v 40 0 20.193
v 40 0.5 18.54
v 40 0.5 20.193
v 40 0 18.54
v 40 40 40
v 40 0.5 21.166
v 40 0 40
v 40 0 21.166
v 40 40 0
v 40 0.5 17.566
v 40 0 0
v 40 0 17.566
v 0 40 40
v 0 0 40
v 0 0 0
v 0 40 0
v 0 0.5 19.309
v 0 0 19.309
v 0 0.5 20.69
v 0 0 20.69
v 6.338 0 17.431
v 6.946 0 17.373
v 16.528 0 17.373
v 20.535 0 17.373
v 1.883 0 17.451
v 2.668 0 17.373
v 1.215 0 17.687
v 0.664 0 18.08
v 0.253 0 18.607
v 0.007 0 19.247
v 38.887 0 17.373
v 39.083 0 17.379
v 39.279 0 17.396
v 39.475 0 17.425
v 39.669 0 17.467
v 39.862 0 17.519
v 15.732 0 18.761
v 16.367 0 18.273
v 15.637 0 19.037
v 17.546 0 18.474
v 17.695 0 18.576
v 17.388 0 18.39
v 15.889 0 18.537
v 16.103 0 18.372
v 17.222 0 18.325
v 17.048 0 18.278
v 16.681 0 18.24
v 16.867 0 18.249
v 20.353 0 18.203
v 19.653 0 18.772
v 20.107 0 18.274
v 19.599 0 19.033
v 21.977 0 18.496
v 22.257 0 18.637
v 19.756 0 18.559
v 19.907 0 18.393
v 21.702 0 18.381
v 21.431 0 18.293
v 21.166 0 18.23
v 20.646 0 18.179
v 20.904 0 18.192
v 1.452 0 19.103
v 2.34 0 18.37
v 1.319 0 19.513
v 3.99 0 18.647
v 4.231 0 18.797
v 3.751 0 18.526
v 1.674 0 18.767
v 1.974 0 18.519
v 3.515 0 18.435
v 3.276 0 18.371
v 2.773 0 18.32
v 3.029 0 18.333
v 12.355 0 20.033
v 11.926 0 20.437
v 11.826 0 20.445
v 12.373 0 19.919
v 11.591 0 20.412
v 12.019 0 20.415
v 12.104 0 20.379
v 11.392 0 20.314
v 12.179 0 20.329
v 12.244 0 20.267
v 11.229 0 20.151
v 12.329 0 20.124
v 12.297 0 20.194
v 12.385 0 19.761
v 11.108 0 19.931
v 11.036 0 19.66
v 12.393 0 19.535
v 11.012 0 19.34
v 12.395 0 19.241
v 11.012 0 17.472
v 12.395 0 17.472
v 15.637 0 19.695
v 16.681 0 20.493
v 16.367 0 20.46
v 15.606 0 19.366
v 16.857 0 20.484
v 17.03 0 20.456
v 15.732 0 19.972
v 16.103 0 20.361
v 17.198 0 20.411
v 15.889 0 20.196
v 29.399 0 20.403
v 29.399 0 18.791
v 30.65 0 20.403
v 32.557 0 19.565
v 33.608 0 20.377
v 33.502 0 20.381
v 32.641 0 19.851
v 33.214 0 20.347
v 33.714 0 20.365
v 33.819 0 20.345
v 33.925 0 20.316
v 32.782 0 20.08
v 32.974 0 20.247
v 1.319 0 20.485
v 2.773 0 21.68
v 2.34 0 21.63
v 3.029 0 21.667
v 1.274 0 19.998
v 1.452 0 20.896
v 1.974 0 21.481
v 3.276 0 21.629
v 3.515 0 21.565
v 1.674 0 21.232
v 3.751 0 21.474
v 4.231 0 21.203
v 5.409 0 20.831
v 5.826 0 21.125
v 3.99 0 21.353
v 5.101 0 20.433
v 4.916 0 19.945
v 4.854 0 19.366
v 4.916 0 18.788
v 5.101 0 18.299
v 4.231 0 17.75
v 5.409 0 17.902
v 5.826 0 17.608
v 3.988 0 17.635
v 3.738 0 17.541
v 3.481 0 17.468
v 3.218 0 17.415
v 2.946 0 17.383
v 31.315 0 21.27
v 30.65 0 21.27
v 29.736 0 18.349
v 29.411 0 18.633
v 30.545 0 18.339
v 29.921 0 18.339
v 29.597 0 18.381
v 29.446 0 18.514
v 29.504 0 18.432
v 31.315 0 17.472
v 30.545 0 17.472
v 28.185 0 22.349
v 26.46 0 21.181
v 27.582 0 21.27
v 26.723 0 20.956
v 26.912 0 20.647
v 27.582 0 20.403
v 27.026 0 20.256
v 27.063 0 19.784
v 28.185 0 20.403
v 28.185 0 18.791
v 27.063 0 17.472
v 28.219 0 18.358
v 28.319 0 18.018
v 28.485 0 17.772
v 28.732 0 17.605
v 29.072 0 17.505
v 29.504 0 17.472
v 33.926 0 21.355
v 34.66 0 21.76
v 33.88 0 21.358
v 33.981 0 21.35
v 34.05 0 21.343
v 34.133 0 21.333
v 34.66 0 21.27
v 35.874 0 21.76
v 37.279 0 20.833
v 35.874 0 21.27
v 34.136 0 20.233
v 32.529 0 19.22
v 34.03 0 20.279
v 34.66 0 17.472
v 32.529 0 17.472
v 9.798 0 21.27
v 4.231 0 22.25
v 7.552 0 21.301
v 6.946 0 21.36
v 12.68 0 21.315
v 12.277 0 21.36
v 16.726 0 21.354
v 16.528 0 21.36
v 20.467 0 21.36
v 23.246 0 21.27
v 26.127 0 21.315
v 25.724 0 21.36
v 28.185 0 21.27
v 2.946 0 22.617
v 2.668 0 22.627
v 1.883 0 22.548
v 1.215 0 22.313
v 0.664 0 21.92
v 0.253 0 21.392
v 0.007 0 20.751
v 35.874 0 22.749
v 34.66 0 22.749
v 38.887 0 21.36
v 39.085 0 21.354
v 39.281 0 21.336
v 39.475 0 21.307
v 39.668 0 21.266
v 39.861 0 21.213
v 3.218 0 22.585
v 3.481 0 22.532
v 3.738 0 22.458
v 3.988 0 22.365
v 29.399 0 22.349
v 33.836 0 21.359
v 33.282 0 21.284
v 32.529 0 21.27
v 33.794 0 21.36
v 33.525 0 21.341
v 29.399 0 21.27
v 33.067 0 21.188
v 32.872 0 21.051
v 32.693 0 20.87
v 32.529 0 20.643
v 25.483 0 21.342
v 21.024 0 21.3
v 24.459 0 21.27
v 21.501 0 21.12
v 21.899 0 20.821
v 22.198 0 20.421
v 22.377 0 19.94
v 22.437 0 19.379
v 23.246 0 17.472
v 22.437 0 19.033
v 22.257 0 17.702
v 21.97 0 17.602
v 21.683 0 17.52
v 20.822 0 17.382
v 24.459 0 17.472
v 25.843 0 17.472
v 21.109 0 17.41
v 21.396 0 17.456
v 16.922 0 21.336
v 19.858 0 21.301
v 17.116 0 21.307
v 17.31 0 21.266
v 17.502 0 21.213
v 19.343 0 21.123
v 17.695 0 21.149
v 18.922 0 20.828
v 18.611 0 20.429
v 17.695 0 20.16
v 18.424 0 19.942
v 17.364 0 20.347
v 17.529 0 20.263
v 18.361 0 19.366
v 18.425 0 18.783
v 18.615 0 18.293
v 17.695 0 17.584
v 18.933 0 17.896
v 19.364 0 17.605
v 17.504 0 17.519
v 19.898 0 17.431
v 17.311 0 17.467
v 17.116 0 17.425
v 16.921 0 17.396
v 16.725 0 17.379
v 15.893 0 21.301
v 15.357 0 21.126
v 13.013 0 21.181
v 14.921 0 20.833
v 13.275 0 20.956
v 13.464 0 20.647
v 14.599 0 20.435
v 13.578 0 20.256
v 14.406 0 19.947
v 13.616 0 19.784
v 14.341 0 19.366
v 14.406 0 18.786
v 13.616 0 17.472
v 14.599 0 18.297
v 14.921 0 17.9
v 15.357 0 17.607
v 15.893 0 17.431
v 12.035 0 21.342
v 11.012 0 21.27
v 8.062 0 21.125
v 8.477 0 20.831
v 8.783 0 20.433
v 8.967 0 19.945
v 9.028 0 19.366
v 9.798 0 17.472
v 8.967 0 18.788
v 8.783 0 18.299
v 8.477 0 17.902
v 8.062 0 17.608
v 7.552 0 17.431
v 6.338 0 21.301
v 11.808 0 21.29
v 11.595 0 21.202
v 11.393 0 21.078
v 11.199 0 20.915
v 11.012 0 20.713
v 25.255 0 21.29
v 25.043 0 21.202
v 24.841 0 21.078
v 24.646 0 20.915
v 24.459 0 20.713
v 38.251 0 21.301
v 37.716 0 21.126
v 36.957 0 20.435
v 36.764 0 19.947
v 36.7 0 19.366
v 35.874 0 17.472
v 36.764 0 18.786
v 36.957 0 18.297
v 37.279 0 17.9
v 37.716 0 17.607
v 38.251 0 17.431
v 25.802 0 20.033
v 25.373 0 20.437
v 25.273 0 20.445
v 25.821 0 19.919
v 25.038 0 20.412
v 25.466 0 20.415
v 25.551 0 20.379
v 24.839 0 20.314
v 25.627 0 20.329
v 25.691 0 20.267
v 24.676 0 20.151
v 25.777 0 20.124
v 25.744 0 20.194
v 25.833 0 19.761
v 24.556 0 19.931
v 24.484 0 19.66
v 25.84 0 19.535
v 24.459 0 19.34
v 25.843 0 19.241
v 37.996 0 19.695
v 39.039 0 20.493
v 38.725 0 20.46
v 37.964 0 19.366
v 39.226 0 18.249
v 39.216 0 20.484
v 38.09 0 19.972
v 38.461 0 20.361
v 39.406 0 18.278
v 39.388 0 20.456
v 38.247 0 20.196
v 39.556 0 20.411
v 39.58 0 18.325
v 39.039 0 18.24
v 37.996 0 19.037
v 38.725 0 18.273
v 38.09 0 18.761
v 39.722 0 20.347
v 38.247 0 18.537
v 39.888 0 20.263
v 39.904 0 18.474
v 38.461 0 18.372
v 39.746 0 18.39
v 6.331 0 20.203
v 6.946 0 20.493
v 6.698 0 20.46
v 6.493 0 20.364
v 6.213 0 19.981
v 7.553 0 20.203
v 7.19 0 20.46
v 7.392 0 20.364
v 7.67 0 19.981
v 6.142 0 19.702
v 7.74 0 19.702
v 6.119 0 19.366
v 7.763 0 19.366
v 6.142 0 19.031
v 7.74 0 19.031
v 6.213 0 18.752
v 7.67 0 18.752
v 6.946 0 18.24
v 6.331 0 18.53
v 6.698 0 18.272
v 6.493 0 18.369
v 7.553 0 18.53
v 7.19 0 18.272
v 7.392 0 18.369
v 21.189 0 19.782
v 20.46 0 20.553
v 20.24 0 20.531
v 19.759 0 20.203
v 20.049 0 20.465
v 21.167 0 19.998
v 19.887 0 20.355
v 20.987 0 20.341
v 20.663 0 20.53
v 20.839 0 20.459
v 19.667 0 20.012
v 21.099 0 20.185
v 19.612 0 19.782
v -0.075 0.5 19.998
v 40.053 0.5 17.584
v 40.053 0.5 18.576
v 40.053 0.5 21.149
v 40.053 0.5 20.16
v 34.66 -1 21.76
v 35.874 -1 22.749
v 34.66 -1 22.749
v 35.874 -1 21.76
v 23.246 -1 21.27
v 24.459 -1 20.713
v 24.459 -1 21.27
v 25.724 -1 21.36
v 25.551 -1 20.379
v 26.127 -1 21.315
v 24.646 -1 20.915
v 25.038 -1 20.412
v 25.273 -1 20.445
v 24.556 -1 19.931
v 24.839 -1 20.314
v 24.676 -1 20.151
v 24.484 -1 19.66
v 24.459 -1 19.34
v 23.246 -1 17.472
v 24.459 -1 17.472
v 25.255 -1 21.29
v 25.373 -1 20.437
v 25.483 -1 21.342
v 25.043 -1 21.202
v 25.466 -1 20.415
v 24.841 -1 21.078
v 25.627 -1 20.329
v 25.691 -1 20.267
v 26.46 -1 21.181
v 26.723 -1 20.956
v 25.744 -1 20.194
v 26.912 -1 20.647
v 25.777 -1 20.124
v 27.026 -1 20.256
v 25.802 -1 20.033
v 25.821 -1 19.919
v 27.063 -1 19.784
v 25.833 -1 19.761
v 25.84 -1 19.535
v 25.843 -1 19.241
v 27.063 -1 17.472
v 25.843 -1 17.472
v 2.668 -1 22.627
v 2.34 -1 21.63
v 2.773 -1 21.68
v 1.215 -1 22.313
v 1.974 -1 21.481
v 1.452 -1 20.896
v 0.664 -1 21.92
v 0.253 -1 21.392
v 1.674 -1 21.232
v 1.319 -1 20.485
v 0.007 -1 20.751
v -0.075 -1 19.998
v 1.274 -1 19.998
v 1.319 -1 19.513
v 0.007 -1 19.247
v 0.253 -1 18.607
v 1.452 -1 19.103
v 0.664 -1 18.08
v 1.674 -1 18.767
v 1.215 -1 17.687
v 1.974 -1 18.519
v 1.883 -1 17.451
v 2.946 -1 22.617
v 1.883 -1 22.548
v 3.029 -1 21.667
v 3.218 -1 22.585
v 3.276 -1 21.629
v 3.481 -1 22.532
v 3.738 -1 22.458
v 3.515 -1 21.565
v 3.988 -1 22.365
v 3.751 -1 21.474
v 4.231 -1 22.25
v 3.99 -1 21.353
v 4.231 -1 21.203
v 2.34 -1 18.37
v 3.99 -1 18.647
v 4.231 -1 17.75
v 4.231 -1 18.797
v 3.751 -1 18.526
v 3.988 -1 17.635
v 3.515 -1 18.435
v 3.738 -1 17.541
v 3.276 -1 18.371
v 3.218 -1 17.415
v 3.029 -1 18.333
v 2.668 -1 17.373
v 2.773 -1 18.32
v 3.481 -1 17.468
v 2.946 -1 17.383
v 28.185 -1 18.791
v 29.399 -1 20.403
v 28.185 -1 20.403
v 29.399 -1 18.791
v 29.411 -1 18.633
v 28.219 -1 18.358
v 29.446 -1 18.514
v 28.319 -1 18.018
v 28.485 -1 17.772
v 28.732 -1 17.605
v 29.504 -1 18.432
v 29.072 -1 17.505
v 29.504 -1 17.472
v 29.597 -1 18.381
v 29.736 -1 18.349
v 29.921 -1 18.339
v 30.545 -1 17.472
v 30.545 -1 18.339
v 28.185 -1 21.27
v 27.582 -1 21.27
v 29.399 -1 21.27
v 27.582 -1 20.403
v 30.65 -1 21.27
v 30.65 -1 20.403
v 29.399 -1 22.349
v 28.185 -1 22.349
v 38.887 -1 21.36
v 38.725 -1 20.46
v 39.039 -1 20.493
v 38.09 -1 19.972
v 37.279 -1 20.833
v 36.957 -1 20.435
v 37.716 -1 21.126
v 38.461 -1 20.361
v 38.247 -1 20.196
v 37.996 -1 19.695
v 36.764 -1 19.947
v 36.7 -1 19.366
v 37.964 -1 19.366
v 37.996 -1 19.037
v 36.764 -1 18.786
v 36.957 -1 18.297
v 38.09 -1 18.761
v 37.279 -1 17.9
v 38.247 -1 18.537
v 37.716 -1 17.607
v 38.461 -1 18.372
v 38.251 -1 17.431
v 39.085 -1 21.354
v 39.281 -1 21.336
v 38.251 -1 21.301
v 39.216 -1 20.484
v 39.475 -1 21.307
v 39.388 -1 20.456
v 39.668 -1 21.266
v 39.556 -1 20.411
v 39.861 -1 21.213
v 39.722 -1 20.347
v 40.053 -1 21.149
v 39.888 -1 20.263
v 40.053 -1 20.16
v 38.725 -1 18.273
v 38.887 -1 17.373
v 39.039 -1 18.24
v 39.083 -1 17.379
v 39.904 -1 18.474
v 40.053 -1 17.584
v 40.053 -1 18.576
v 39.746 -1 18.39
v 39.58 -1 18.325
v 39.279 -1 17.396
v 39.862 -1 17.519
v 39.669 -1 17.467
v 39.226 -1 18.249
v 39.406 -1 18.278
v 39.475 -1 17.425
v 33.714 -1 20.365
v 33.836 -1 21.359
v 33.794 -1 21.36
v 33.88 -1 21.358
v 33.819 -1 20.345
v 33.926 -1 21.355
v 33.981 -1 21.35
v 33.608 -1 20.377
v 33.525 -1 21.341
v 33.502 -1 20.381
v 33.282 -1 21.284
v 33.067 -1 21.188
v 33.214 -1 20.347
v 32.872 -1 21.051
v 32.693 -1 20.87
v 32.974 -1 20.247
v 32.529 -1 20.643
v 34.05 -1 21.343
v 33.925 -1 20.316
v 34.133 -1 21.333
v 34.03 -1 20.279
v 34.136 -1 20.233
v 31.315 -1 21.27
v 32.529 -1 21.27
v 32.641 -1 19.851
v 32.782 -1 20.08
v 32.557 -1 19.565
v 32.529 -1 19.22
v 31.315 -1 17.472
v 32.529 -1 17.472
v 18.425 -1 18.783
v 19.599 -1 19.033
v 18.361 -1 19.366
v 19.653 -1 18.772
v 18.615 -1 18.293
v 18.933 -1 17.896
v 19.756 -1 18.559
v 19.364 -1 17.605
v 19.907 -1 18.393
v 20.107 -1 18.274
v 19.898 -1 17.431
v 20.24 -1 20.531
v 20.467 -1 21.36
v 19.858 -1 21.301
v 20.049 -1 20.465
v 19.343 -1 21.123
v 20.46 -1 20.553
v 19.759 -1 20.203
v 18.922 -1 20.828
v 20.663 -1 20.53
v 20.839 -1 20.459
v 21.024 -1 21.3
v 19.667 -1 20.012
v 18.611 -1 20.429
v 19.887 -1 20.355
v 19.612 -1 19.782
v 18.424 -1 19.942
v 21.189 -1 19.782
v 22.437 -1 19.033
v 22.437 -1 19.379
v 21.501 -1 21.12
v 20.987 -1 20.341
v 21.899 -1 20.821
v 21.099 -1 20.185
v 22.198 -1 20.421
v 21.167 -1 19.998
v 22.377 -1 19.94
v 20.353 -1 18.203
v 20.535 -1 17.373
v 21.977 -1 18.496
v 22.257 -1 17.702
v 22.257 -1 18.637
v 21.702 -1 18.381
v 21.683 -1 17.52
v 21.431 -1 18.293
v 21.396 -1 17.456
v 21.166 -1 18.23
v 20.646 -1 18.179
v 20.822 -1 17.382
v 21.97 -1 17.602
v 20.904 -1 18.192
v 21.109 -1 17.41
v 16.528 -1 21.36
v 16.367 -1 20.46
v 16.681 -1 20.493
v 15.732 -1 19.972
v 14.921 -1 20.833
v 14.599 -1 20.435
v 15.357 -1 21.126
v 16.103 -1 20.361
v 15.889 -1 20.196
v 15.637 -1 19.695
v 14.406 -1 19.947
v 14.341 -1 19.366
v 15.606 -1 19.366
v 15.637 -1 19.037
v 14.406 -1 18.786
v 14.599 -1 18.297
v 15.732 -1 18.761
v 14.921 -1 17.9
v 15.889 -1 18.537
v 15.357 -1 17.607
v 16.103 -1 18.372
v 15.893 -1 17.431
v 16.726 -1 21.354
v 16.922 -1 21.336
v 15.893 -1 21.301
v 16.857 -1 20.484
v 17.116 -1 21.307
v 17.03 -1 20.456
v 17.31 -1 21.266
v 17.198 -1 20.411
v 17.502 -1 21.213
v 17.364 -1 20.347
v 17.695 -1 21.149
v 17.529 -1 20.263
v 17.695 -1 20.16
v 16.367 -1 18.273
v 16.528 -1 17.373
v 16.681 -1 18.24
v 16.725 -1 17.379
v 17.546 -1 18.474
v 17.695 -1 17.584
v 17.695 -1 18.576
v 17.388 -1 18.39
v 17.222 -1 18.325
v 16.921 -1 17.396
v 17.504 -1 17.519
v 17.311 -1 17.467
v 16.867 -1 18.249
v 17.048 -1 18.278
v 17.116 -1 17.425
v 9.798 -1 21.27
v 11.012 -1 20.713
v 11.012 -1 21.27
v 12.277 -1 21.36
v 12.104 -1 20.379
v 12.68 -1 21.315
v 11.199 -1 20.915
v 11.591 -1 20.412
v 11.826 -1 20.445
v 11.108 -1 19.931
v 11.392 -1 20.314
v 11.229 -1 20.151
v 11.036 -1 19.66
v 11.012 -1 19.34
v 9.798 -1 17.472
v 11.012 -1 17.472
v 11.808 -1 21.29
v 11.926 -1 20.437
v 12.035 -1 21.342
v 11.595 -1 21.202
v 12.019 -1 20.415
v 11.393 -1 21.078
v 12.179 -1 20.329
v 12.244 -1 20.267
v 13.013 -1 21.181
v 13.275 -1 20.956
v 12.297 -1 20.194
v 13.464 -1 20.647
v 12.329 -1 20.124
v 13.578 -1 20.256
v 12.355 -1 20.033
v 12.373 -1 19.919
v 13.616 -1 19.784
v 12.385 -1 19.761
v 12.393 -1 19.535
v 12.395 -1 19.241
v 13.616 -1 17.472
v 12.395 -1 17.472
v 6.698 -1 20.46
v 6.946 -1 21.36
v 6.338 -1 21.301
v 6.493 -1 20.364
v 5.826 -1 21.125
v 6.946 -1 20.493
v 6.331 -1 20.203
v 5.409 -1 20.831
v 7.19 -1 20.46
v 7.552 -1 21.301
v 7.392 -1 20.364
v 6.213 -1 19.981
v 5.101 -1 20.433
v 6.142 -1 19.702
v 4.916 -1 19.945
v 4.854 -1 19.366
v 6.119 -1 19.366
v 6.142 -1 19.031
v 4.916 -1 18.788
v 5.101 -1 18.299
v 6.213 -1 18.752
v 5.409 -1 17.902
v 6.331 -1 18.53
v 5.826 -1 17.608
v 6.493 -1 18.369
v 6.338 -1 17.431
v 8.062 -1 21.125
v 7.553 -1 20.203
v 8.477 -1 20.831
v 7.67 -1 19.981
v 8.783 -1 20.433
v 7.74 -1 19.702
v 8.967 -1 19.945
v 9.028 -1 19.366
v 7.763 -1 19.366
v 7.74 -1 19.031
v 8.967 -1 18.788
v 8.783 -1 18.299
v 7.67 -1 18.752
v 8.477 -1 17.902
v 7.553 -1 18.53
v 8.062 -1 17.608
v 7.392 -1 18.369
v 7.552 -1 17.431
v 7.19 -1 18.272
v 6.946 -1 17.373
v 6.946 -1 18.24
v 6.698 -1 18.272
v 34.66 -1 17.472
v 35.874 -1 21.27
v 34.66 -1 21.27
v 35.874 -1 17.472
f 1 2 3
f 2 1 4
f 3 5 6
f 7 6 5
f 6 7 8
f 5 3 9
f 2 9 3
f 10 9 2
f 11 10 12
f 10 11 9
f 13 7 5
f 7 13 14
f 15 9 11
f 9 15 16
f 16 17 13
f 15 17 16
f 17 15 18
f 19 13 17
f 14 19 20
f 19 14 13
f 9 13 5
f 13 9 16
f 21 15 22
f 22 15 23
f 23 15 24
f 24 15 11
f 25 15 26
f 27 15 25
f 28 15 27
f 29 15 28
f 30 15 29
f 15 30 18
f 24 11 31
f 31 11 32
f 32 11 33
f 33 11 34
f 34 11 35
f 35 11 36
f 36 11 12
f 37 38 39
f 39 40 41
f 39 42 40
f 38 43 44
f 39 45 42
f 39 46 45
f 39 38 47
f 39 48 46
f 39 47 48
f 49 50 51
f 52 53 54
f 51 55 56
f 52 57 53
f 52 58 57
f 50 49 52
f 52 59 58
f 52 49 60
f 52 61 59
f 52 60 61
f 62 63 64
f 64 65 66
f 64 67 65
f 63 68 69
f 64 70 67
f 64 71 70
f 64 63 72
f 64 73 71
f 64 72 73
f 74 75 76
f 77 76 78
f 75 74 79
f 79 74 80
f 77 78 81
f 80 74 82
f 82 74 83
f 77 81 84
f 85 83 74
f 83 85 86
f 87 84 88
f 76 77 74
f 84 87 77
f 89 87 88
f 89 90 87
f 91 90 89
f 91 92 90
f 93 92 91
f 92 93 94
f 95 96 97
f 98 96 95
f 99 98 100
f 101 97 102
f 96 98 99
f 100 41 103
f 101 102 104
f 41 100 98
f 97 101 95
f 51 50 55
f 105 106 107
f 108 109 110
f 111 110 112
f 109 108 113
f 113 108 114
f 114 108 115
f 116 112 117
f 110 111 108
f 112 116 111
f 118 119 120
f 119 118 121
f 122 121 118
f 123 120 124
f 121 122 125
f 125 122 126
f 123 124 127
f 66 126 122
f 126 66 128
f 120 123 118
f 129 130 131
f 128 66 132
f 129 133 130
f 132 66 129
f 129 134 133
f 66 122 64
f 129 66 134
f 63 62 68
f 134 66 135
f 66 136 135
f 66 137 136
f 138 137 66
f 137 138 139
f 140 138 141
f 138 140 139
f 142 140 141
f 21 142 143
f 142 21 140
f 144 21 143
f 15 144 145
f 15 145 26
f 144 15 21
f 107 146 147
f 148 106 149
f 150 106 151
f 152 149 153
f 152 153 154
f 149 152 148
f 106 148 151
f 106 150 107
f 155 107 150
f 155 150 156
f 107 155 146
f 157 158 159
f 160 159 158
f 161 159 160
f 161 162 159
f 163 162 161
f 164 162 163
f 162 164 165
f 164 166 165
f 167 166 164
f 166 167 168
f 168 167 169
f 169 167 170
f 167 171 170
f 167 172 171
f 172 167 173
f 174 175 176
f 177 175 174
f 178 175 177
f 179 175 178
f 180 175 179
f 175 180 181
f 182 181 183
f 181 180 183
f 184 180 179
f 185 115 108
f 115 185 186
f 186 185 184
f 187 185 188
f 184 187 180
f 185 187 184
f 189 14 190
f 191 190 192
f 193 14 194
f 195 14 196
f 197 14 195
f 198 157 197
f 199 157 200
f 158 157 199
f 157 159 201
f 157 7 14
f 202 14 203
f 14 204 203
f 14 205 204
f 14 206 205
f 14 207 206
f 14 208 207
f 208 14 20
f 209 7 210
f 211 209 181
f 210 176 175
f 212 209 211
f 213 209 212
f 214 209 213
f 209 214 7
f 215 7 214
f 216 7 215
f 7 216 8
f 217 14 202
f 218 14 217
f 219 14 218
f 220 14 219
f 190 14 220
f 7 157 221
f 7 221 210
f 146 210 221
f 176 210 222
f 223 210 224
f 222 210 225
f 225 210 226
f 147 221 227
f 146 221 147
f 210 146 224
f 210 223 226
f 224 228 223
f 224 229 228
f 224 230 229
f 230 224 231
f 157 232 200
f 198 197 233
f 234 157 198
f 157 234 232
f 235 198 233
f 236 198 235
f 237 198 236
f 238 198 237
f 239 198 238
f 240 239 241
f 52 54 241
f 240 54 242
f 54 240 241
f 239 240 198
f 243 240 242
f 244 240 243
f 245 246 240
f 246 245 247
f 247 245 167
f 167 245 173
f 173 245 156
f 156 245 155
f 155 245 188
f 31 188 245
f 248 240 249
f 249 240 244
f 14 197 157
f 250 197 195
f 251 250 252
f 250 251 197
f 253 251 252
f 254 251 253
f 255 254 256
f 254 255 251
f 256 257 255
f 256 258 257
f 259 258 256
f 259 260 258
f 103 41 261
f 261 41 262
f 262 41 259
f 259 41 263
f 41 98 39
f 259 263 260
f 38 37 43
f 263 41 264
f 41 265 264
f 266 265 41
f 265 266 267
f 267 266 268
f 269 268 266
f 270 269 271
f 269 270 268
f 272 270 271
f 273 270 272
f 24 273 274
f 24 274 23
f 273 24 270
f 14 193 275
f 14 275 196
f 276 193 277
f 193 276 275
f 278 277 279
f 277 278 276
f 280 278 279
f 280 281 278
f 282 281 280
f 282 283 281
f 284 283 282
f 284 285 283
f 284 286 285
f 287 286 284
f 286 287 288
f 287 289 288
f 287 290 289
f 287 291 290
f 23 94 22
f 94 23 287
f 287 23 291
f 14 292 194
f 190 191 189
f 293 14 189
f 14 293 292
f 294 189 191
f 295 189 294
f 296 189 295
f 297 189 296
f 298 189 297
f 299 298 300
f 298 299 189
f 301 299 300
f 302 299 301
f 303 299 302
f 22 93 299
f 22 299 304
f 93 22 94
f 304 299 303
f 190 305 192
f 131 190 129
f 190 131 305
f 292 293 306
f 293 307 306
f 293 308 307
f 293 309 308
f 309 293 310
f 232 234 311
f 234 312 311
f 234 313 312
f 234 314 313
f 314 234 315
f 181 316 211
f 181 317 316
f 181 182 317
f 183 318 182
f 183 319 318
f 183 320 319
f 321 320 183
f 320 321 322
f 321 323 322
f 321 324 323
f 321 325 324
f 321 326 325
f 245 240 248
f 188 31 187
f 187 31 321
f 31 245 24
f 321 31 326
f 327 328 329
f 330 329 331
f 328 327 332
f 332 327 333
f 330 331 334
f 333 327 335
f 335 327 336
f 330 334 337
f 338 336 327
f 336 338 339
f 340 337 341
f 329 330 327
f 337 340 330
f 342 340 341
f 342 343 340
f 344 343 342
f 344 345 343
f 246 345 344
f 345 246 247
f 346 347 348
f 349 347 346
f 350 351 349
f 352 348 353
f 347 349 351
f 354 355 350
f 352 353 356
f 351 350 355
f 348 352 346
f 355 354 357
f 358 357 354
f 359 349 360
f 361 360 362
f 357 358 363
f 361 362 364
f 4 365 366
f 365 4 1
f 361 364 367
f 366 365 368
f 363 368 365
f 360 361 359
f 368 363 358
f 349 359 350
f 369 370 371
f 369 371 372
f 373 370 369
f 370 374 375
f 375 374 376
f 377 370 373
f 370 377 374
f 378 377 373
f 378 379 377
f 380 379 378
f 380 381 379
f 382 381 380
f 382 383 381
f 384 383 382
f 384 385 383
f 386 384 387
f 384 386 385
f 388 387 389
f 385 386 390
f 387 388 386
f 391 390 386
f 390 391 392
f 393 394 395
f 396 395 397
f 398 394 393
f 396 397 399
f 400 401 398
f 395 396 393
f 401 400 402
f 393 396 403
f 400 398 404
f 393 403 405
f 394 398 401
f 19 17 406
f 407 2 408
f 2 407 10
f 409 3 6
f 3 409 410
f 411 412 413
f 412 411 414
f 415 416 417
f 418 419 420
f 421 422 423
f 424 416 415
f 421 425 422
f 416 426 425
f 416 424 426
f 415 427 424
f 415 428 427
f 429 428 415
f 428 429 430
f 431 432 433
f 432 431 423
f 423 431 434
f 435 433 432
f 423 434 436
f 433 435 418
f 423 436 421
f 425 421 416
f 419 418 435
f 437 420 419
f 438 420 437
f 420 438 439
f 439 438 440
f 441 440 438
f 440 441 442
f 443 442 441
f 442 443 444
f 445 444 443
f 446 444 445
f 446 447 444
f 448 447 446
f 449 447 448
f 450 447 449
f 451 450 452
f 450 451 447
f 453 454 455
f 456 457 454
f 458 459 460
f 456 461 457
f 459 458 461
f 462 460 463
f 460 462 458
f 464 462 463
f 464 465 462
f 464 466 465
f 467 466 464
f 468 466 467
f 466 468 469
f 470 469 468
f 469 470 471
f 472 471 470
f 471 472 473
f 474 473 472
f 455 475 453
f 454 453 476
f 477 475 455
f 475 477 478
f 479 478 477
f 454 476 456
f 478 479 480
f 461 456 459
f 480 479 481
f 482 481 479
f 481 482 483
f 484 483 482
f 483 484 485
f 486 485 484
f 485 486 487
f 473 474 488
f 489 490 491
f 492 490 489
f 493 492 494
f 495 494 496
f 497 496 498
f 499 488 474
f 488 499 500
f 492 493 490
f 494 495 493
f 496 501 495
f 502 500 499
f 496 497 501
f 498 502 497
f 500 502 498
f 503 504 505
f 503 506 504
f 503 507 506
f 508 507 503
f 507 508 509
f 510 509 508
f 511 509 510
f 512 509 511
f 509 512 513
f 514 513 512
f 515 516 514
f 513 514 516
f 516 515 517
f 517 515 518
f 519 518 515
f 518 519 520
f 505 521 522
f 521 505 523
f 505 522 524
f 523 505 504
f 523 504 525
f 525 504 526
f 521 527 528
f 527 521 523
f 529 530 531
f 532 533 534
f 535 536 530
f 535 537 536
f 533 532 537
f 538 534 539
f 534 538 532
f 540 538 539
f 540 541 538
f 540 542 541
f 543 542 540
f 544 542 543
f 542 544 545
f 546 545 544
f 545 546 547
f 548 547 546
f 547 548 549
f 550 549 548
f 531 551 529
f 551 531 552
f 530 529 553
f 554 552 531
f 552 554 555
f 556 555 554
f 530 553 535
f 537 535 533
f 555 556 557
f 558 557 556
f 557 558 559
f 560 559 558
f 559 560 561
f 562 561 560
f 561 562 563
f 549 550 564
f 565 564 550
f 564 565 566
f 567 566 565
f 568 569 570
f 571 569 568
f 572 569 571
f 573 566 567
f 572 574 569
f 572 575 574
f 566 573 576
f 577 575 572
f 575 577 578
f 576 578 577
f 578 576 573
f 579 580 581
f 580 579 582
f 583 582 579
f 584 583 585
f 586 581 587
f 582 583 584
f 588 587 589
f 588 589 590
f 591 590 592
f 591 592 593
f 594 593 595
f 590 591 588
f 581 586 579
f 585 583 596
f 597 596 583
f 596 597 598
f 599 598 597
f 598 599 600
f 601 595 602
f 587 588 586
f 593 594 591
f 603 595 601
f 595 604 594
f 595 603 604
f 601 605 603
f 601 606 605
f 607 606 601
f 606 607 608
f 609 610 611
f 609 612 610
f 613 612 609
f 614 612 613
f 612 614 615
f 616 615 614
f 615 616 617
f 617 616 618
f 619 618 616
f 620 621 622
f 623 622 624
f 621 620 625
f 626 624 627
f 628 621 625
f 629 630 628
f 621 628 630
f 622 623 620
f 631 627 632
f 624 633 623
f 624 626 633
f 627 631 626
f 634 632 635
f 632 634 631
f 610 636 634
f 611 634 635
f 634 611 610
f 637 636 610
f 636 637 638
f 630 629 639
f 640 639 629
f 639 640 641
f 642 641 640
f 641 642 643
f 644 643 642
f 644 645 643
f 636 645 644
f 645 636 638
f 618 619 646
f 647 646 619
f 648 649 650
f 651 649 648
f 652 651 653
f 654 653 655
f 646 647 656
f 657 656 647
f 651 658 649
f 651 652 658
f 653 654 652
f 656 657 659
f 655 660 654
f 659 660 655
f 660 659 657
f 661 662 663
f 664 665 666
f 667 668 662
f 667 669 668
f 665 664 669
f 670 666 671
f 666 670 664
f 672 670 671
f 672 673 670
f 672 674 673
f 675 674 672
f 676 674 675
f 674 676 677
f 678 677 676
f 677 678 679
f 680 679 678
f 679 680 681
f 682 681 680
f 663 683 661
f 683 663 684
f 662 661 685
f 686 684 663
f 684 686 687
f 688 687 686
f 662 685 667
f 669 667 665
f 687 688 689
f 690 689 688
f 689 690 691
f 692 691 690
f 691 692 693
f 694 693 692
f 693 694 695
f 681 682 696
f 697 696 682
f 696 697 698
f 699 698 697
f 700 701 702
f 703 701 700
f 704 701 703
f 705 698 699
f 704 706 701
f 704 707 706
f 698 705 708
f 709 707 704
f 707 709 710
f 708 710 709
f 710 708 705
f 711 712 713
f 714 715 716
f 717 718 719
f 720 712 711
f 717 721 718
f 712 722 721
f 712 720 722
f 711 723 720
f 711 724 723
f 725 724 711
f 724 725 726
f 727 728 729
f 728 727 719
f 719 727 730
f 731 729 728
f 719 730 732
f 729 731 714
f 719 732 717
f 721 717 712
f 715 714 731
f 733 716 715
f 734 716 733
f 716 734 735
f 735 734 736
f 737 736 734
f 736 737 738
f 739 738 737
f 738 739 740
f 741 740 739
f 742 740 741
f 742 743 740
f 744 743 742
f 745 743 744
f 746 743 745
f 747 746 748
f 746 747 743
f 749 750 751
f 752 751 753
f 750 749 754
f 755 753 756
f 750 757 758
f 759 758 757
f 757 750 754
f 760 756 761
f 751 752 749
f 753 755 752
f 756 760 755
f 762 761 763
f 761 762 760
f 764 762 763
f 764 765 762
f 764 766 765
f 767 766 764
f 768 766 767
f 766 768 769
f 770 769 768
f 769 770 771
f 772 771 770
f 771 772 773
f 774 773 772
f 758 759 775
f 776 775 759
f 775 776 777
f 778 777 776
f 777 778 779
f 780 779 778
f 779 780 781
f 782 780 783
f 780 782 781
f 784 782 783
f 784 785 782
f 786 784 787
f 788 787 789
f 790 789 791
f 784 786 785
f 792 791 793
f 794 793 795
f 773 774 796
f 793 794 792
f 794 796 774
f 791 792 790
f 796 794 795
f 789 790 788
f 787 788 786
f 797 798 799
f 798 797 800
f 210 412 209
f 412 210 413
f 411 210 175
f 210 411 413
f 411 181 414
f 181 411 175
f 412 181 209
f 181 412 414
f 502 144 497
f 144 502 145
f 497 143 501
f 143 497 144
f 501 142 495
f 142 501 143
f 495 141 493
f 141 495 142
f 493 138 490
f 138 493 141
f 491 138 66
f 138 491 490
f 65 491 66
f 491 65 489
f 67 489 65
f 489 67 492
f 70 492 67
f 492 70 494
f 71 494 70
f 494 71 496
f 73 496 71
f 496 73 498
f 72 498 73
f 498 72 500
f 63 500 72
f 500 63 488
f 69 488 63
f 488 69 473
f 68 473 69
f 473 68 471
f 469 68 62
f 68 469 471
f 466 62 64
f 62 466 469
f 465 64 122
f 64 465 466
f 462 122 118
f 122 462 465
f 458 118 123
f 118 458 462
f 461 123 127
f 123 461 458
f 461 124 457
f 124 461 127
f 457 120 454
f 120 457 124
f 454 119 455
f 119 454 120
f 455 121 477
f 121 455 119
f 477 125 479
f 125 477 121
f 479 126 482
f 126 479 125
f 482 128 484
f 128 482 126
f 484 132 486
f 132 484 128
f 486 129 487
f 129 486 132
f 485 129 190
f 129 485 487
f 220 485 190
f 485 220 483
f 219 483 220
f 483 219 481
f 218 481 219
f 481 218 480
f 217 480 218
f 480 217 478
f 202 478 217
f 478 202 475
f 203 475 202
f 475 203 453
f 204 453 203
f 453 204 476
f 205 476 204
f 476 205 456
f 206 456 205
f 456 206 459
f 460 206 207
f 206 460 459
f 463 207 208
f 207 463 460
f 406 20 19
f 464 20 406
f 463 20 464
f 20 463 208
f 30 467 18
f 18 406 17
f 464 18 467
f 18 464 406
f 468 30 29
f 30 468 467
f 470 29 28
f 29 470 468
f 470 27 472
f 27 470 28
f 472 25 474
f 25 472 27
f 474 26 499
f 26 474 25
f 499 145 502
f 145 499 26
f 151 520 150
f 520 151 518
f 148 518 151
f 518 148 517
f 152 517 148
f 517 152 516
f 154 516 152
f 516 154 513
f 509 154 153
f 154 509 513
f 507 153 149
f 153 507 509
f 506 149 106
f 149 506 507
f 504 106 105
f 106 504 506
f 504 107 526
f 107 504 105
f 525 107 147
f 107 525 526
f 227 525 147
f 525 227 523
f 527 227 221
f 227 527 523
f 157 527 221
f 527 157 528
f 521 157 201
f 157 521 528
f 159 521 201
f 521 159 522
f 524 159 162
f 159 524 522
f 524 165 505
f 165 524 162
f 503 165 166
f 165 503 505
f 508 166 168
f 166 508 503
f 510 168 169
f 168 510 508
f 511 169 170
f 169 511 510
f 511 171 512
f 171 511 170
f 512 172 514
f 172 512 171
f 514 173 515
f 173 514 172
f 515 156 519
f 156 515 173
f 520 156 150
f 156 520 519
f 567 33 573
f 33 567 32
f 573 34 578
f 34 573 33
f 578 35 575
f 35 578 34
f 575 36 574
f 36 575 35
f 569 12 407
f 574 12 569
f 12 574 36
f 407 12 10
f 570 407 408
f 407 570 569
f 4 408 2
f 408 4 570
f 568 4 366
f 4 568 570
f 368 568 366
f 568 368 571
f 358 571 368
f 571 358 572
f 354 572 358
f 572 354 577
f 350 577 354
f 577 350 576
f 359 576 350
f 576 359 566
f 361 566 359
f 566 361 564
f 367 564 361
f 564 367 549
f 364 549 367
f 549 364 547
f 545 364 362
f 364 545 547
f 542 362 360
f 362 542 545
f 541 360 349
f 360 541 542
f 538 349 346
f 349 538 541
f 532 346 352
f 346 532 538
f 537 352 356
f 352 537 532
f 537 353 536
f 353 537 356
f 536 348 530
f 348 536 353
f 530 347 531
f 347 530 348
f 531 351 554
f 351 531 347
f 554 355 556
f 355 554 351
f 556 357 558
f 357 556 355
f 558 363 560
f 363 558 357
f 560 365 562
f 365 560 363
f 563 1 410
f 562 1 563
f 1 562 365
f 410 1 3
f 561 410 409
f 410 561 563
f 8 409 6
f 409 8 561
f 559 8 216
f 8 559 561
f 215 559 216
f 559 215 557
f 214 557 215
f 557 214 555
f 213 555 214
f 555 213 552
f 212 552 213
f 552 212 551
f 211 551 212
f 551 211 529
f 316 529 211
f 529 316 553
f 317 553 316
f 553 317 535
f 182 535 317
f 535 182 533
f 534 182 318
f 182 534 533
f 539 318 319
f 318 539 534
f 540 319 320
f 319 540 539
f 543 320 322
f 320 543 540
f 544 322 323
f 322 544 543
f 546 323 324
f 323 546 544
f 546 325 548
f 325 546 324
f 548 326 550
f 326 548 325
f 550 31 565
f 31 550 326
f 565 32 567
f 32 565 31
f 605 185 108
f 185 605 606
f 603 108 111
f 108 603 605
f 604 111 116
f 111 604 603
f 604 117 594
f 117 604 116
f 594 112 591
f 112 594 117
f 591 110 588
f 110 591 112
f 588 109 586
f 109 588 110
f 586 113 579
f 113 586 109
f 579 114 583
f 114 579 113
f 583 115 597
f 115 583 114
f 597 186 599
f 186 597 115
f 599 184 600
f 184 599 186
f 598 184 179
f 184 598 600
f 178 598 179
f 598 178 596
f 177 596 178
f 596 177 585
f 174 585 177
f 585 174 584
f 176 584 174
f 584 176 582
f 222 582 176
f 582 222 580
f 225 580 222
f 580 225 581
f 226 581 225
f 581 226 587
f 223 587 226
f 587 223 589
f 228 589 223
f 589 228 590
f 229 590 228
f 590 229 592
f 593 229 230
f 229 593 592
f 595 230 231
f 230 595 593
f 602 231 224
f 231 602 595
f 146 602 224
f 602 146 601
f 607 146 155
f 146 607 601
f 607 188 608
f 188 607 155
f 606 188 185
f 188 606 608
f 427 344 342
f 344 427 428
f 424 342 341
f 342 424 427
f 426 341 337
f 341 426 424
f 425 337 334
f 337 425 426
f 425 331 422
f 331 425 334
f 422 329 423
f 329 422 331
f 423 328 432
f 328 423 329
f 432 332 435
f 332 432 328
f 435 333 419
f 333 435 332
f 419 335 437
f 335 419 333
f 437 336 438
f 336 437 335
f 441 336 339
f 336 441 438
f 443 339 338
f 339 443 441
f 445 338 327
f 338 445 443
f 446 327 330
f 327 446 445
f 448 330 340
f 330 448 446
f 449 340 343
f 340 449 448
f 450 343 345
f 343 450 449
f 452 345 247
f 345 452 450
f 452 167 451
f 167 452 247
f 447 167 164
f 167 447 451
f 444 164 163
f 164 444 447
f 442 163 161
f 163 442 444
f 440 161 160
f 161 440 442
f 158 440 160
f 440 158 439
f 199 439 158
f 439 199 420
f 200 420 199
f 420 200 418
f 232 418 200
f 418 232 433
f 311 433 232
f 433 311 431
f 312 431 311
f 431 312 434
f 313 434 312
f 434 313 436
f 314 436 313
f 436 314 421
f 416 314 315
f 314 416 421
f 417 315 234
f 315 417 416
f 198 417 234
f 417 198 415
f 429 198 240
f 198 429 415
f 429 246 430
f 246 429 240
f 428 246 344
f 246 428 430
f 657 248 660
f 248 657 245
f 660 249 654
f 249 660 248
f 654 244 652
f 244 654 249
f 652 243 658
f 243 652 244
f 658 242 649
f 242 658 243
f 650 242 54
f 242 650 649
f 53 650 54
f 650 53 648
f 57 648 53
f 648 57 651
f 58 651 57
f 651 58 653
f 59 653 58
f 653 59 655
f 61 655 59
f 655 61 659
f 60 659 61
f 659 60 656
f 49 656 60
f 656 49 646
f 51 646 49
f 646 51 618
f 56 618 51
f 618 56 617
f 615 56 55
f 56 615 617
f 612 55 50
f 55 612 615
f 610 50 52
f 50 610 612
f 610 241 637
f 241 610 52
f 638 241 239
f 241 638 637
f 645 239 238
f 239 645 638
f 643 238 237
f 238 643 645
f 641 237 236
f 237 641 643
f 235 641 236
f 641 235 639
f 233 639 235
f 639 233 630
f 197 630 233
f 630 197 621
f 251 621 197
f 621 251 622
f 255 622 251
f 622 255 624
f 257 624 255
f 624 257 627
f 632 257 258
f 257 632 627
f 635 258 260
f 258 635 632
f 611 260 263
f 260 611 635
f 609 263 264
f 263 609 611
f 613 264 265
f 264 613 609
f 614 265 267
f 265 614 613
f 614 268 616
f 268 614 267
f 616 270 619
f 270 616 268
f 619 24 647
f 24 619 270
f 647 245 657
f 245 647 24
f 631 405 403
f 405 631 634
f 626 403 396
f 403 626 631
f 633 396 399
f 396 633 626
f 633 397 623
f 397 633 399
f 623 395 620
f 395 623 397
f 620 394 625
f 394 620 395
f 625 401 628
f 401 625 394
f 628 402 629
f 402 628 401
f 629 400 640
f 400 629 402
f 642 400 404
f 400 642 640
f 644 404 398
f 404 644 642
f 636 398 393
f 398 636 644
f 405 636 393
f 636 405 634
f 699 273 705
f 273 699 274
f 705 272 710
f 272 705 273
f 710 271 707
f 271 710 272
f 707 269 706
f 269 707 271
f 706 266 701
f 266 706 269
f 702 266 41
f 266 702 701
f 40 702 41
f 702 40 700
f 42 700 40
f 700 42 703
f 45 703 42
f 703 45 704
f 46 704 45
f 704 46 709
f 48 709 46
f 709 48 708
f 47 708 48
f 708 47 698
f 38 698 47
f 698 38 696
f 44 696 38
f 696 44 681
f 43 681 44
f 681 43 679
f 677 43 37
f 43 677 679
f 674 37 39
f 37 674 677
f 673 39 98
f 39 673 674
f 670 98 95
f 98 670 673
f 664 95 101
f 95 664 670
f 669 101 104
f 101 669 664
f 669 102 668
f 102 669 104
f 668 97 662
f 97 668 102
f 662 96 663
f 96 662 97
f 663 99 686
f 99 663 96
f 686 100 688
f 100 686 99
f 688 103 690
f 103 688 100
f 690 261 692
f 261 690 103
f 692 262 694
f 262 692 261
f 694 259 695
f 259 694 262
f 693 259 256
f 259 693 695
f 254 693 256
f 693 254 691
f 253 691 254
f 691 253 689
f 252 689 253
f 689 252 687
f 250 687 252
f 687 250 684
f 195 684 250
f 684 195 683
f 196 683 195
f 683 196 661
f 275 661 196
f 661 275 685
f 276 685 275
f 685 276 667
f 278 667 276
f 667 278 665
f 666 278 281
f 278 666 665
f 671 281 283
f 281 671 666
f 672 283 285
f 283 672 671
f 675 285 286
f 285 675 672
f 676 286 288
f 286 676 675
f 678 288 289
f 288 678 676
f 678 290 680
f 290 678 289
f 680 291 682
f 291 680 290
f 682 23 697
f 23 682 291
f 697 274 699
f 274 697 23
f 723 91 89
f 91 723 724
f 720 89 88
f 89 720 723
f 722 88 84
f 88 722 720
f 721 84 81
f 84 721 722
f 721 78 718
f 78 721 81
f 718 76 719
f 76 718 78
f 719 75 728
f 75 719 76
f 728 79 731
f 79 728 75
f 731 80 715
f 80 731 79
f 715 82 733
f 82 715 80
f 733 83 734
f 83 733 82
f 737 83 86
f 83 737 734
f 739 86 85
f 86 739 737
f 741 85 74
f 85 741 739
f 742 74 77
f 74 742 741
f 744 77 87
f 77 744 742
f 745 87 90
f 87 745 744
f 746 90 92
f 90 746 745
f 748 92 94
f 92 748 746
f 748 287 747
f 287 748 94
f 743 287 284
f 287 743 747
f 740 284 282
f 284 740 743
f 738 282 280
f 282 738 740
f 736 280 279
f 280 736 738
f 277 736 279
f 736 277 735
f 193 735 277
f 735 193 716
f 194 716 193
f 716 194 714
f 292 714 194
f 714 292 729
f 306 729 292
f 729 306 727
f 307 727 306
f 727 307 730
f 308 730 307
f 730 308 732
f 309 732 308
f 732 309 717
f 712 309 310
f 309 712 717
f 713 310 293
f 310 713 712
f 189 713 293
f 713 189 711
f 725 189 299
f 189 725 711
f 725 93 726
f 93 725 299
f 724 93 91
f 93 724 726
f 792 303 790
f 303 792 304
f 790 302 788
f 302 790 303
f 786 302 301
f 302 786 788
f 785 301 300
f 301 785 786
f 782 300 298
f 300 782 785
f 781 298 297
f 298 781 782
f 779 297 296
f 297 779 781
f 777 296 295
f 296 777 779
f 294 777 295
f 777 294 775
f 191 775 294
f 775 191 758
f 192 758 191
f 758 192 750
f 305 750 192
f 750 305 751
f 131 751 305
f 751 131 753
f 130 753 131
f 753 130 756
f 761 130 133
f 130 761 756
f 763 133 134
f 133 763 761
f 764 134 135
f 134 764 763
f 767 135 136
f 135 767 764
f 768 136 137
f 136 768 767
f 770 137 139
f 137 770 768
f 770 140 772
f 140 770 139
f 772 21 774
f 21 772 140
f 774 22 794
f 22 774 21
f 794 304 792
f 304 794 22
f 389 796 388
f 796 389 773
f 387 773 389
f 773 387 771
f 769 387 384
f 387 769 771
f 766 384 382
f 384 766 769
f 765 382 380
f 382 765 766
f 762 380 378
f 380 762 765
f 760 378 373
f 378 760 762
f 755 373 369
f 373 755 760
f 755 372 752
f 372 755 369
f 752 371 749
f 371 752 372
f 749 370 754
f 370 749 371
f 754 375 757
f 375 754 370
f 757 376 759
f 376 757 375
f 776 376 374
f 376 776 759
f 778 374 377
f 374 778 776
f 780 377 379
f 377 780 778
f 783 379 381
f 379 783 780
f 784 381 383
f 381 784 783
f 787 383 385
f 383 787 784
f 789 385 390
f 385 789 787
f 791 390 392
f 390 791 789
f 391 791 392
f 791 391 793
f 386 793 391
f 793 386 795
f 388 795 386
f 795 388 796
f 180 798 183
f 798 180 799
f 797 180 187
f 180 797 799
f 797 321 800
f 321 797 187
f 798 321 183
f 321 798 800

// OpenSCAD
// Rangweezus Education Cubes
    //inspired by mathgrrl testbots
////////////////////////////////////////////////////
// parameters

fontType = "Source Sans Pro:style=Bold";
fontDepth = 1.5*1;


////////////////////////////////////////////////////
// Start Values

//appears on cube
Label = "Concentric";

//fontSize
  fontSize = 5;

// side length in mm
cubeSize = 40;

////////////////////////////////////////////////////
//  Render


//  Union of Text and Cube

union(){
    cube([cubeSize, cubeSize, cubeSize]);
    rotate(90, [1,0,0])
    translate([.5*cubeSize, .5*cubeSize, -.5])
    color("white")
    linear_extrude(height=fontDepth)
    text(Label,font=fontType,size=fontSize,halign="center",valign="center");
}
   
